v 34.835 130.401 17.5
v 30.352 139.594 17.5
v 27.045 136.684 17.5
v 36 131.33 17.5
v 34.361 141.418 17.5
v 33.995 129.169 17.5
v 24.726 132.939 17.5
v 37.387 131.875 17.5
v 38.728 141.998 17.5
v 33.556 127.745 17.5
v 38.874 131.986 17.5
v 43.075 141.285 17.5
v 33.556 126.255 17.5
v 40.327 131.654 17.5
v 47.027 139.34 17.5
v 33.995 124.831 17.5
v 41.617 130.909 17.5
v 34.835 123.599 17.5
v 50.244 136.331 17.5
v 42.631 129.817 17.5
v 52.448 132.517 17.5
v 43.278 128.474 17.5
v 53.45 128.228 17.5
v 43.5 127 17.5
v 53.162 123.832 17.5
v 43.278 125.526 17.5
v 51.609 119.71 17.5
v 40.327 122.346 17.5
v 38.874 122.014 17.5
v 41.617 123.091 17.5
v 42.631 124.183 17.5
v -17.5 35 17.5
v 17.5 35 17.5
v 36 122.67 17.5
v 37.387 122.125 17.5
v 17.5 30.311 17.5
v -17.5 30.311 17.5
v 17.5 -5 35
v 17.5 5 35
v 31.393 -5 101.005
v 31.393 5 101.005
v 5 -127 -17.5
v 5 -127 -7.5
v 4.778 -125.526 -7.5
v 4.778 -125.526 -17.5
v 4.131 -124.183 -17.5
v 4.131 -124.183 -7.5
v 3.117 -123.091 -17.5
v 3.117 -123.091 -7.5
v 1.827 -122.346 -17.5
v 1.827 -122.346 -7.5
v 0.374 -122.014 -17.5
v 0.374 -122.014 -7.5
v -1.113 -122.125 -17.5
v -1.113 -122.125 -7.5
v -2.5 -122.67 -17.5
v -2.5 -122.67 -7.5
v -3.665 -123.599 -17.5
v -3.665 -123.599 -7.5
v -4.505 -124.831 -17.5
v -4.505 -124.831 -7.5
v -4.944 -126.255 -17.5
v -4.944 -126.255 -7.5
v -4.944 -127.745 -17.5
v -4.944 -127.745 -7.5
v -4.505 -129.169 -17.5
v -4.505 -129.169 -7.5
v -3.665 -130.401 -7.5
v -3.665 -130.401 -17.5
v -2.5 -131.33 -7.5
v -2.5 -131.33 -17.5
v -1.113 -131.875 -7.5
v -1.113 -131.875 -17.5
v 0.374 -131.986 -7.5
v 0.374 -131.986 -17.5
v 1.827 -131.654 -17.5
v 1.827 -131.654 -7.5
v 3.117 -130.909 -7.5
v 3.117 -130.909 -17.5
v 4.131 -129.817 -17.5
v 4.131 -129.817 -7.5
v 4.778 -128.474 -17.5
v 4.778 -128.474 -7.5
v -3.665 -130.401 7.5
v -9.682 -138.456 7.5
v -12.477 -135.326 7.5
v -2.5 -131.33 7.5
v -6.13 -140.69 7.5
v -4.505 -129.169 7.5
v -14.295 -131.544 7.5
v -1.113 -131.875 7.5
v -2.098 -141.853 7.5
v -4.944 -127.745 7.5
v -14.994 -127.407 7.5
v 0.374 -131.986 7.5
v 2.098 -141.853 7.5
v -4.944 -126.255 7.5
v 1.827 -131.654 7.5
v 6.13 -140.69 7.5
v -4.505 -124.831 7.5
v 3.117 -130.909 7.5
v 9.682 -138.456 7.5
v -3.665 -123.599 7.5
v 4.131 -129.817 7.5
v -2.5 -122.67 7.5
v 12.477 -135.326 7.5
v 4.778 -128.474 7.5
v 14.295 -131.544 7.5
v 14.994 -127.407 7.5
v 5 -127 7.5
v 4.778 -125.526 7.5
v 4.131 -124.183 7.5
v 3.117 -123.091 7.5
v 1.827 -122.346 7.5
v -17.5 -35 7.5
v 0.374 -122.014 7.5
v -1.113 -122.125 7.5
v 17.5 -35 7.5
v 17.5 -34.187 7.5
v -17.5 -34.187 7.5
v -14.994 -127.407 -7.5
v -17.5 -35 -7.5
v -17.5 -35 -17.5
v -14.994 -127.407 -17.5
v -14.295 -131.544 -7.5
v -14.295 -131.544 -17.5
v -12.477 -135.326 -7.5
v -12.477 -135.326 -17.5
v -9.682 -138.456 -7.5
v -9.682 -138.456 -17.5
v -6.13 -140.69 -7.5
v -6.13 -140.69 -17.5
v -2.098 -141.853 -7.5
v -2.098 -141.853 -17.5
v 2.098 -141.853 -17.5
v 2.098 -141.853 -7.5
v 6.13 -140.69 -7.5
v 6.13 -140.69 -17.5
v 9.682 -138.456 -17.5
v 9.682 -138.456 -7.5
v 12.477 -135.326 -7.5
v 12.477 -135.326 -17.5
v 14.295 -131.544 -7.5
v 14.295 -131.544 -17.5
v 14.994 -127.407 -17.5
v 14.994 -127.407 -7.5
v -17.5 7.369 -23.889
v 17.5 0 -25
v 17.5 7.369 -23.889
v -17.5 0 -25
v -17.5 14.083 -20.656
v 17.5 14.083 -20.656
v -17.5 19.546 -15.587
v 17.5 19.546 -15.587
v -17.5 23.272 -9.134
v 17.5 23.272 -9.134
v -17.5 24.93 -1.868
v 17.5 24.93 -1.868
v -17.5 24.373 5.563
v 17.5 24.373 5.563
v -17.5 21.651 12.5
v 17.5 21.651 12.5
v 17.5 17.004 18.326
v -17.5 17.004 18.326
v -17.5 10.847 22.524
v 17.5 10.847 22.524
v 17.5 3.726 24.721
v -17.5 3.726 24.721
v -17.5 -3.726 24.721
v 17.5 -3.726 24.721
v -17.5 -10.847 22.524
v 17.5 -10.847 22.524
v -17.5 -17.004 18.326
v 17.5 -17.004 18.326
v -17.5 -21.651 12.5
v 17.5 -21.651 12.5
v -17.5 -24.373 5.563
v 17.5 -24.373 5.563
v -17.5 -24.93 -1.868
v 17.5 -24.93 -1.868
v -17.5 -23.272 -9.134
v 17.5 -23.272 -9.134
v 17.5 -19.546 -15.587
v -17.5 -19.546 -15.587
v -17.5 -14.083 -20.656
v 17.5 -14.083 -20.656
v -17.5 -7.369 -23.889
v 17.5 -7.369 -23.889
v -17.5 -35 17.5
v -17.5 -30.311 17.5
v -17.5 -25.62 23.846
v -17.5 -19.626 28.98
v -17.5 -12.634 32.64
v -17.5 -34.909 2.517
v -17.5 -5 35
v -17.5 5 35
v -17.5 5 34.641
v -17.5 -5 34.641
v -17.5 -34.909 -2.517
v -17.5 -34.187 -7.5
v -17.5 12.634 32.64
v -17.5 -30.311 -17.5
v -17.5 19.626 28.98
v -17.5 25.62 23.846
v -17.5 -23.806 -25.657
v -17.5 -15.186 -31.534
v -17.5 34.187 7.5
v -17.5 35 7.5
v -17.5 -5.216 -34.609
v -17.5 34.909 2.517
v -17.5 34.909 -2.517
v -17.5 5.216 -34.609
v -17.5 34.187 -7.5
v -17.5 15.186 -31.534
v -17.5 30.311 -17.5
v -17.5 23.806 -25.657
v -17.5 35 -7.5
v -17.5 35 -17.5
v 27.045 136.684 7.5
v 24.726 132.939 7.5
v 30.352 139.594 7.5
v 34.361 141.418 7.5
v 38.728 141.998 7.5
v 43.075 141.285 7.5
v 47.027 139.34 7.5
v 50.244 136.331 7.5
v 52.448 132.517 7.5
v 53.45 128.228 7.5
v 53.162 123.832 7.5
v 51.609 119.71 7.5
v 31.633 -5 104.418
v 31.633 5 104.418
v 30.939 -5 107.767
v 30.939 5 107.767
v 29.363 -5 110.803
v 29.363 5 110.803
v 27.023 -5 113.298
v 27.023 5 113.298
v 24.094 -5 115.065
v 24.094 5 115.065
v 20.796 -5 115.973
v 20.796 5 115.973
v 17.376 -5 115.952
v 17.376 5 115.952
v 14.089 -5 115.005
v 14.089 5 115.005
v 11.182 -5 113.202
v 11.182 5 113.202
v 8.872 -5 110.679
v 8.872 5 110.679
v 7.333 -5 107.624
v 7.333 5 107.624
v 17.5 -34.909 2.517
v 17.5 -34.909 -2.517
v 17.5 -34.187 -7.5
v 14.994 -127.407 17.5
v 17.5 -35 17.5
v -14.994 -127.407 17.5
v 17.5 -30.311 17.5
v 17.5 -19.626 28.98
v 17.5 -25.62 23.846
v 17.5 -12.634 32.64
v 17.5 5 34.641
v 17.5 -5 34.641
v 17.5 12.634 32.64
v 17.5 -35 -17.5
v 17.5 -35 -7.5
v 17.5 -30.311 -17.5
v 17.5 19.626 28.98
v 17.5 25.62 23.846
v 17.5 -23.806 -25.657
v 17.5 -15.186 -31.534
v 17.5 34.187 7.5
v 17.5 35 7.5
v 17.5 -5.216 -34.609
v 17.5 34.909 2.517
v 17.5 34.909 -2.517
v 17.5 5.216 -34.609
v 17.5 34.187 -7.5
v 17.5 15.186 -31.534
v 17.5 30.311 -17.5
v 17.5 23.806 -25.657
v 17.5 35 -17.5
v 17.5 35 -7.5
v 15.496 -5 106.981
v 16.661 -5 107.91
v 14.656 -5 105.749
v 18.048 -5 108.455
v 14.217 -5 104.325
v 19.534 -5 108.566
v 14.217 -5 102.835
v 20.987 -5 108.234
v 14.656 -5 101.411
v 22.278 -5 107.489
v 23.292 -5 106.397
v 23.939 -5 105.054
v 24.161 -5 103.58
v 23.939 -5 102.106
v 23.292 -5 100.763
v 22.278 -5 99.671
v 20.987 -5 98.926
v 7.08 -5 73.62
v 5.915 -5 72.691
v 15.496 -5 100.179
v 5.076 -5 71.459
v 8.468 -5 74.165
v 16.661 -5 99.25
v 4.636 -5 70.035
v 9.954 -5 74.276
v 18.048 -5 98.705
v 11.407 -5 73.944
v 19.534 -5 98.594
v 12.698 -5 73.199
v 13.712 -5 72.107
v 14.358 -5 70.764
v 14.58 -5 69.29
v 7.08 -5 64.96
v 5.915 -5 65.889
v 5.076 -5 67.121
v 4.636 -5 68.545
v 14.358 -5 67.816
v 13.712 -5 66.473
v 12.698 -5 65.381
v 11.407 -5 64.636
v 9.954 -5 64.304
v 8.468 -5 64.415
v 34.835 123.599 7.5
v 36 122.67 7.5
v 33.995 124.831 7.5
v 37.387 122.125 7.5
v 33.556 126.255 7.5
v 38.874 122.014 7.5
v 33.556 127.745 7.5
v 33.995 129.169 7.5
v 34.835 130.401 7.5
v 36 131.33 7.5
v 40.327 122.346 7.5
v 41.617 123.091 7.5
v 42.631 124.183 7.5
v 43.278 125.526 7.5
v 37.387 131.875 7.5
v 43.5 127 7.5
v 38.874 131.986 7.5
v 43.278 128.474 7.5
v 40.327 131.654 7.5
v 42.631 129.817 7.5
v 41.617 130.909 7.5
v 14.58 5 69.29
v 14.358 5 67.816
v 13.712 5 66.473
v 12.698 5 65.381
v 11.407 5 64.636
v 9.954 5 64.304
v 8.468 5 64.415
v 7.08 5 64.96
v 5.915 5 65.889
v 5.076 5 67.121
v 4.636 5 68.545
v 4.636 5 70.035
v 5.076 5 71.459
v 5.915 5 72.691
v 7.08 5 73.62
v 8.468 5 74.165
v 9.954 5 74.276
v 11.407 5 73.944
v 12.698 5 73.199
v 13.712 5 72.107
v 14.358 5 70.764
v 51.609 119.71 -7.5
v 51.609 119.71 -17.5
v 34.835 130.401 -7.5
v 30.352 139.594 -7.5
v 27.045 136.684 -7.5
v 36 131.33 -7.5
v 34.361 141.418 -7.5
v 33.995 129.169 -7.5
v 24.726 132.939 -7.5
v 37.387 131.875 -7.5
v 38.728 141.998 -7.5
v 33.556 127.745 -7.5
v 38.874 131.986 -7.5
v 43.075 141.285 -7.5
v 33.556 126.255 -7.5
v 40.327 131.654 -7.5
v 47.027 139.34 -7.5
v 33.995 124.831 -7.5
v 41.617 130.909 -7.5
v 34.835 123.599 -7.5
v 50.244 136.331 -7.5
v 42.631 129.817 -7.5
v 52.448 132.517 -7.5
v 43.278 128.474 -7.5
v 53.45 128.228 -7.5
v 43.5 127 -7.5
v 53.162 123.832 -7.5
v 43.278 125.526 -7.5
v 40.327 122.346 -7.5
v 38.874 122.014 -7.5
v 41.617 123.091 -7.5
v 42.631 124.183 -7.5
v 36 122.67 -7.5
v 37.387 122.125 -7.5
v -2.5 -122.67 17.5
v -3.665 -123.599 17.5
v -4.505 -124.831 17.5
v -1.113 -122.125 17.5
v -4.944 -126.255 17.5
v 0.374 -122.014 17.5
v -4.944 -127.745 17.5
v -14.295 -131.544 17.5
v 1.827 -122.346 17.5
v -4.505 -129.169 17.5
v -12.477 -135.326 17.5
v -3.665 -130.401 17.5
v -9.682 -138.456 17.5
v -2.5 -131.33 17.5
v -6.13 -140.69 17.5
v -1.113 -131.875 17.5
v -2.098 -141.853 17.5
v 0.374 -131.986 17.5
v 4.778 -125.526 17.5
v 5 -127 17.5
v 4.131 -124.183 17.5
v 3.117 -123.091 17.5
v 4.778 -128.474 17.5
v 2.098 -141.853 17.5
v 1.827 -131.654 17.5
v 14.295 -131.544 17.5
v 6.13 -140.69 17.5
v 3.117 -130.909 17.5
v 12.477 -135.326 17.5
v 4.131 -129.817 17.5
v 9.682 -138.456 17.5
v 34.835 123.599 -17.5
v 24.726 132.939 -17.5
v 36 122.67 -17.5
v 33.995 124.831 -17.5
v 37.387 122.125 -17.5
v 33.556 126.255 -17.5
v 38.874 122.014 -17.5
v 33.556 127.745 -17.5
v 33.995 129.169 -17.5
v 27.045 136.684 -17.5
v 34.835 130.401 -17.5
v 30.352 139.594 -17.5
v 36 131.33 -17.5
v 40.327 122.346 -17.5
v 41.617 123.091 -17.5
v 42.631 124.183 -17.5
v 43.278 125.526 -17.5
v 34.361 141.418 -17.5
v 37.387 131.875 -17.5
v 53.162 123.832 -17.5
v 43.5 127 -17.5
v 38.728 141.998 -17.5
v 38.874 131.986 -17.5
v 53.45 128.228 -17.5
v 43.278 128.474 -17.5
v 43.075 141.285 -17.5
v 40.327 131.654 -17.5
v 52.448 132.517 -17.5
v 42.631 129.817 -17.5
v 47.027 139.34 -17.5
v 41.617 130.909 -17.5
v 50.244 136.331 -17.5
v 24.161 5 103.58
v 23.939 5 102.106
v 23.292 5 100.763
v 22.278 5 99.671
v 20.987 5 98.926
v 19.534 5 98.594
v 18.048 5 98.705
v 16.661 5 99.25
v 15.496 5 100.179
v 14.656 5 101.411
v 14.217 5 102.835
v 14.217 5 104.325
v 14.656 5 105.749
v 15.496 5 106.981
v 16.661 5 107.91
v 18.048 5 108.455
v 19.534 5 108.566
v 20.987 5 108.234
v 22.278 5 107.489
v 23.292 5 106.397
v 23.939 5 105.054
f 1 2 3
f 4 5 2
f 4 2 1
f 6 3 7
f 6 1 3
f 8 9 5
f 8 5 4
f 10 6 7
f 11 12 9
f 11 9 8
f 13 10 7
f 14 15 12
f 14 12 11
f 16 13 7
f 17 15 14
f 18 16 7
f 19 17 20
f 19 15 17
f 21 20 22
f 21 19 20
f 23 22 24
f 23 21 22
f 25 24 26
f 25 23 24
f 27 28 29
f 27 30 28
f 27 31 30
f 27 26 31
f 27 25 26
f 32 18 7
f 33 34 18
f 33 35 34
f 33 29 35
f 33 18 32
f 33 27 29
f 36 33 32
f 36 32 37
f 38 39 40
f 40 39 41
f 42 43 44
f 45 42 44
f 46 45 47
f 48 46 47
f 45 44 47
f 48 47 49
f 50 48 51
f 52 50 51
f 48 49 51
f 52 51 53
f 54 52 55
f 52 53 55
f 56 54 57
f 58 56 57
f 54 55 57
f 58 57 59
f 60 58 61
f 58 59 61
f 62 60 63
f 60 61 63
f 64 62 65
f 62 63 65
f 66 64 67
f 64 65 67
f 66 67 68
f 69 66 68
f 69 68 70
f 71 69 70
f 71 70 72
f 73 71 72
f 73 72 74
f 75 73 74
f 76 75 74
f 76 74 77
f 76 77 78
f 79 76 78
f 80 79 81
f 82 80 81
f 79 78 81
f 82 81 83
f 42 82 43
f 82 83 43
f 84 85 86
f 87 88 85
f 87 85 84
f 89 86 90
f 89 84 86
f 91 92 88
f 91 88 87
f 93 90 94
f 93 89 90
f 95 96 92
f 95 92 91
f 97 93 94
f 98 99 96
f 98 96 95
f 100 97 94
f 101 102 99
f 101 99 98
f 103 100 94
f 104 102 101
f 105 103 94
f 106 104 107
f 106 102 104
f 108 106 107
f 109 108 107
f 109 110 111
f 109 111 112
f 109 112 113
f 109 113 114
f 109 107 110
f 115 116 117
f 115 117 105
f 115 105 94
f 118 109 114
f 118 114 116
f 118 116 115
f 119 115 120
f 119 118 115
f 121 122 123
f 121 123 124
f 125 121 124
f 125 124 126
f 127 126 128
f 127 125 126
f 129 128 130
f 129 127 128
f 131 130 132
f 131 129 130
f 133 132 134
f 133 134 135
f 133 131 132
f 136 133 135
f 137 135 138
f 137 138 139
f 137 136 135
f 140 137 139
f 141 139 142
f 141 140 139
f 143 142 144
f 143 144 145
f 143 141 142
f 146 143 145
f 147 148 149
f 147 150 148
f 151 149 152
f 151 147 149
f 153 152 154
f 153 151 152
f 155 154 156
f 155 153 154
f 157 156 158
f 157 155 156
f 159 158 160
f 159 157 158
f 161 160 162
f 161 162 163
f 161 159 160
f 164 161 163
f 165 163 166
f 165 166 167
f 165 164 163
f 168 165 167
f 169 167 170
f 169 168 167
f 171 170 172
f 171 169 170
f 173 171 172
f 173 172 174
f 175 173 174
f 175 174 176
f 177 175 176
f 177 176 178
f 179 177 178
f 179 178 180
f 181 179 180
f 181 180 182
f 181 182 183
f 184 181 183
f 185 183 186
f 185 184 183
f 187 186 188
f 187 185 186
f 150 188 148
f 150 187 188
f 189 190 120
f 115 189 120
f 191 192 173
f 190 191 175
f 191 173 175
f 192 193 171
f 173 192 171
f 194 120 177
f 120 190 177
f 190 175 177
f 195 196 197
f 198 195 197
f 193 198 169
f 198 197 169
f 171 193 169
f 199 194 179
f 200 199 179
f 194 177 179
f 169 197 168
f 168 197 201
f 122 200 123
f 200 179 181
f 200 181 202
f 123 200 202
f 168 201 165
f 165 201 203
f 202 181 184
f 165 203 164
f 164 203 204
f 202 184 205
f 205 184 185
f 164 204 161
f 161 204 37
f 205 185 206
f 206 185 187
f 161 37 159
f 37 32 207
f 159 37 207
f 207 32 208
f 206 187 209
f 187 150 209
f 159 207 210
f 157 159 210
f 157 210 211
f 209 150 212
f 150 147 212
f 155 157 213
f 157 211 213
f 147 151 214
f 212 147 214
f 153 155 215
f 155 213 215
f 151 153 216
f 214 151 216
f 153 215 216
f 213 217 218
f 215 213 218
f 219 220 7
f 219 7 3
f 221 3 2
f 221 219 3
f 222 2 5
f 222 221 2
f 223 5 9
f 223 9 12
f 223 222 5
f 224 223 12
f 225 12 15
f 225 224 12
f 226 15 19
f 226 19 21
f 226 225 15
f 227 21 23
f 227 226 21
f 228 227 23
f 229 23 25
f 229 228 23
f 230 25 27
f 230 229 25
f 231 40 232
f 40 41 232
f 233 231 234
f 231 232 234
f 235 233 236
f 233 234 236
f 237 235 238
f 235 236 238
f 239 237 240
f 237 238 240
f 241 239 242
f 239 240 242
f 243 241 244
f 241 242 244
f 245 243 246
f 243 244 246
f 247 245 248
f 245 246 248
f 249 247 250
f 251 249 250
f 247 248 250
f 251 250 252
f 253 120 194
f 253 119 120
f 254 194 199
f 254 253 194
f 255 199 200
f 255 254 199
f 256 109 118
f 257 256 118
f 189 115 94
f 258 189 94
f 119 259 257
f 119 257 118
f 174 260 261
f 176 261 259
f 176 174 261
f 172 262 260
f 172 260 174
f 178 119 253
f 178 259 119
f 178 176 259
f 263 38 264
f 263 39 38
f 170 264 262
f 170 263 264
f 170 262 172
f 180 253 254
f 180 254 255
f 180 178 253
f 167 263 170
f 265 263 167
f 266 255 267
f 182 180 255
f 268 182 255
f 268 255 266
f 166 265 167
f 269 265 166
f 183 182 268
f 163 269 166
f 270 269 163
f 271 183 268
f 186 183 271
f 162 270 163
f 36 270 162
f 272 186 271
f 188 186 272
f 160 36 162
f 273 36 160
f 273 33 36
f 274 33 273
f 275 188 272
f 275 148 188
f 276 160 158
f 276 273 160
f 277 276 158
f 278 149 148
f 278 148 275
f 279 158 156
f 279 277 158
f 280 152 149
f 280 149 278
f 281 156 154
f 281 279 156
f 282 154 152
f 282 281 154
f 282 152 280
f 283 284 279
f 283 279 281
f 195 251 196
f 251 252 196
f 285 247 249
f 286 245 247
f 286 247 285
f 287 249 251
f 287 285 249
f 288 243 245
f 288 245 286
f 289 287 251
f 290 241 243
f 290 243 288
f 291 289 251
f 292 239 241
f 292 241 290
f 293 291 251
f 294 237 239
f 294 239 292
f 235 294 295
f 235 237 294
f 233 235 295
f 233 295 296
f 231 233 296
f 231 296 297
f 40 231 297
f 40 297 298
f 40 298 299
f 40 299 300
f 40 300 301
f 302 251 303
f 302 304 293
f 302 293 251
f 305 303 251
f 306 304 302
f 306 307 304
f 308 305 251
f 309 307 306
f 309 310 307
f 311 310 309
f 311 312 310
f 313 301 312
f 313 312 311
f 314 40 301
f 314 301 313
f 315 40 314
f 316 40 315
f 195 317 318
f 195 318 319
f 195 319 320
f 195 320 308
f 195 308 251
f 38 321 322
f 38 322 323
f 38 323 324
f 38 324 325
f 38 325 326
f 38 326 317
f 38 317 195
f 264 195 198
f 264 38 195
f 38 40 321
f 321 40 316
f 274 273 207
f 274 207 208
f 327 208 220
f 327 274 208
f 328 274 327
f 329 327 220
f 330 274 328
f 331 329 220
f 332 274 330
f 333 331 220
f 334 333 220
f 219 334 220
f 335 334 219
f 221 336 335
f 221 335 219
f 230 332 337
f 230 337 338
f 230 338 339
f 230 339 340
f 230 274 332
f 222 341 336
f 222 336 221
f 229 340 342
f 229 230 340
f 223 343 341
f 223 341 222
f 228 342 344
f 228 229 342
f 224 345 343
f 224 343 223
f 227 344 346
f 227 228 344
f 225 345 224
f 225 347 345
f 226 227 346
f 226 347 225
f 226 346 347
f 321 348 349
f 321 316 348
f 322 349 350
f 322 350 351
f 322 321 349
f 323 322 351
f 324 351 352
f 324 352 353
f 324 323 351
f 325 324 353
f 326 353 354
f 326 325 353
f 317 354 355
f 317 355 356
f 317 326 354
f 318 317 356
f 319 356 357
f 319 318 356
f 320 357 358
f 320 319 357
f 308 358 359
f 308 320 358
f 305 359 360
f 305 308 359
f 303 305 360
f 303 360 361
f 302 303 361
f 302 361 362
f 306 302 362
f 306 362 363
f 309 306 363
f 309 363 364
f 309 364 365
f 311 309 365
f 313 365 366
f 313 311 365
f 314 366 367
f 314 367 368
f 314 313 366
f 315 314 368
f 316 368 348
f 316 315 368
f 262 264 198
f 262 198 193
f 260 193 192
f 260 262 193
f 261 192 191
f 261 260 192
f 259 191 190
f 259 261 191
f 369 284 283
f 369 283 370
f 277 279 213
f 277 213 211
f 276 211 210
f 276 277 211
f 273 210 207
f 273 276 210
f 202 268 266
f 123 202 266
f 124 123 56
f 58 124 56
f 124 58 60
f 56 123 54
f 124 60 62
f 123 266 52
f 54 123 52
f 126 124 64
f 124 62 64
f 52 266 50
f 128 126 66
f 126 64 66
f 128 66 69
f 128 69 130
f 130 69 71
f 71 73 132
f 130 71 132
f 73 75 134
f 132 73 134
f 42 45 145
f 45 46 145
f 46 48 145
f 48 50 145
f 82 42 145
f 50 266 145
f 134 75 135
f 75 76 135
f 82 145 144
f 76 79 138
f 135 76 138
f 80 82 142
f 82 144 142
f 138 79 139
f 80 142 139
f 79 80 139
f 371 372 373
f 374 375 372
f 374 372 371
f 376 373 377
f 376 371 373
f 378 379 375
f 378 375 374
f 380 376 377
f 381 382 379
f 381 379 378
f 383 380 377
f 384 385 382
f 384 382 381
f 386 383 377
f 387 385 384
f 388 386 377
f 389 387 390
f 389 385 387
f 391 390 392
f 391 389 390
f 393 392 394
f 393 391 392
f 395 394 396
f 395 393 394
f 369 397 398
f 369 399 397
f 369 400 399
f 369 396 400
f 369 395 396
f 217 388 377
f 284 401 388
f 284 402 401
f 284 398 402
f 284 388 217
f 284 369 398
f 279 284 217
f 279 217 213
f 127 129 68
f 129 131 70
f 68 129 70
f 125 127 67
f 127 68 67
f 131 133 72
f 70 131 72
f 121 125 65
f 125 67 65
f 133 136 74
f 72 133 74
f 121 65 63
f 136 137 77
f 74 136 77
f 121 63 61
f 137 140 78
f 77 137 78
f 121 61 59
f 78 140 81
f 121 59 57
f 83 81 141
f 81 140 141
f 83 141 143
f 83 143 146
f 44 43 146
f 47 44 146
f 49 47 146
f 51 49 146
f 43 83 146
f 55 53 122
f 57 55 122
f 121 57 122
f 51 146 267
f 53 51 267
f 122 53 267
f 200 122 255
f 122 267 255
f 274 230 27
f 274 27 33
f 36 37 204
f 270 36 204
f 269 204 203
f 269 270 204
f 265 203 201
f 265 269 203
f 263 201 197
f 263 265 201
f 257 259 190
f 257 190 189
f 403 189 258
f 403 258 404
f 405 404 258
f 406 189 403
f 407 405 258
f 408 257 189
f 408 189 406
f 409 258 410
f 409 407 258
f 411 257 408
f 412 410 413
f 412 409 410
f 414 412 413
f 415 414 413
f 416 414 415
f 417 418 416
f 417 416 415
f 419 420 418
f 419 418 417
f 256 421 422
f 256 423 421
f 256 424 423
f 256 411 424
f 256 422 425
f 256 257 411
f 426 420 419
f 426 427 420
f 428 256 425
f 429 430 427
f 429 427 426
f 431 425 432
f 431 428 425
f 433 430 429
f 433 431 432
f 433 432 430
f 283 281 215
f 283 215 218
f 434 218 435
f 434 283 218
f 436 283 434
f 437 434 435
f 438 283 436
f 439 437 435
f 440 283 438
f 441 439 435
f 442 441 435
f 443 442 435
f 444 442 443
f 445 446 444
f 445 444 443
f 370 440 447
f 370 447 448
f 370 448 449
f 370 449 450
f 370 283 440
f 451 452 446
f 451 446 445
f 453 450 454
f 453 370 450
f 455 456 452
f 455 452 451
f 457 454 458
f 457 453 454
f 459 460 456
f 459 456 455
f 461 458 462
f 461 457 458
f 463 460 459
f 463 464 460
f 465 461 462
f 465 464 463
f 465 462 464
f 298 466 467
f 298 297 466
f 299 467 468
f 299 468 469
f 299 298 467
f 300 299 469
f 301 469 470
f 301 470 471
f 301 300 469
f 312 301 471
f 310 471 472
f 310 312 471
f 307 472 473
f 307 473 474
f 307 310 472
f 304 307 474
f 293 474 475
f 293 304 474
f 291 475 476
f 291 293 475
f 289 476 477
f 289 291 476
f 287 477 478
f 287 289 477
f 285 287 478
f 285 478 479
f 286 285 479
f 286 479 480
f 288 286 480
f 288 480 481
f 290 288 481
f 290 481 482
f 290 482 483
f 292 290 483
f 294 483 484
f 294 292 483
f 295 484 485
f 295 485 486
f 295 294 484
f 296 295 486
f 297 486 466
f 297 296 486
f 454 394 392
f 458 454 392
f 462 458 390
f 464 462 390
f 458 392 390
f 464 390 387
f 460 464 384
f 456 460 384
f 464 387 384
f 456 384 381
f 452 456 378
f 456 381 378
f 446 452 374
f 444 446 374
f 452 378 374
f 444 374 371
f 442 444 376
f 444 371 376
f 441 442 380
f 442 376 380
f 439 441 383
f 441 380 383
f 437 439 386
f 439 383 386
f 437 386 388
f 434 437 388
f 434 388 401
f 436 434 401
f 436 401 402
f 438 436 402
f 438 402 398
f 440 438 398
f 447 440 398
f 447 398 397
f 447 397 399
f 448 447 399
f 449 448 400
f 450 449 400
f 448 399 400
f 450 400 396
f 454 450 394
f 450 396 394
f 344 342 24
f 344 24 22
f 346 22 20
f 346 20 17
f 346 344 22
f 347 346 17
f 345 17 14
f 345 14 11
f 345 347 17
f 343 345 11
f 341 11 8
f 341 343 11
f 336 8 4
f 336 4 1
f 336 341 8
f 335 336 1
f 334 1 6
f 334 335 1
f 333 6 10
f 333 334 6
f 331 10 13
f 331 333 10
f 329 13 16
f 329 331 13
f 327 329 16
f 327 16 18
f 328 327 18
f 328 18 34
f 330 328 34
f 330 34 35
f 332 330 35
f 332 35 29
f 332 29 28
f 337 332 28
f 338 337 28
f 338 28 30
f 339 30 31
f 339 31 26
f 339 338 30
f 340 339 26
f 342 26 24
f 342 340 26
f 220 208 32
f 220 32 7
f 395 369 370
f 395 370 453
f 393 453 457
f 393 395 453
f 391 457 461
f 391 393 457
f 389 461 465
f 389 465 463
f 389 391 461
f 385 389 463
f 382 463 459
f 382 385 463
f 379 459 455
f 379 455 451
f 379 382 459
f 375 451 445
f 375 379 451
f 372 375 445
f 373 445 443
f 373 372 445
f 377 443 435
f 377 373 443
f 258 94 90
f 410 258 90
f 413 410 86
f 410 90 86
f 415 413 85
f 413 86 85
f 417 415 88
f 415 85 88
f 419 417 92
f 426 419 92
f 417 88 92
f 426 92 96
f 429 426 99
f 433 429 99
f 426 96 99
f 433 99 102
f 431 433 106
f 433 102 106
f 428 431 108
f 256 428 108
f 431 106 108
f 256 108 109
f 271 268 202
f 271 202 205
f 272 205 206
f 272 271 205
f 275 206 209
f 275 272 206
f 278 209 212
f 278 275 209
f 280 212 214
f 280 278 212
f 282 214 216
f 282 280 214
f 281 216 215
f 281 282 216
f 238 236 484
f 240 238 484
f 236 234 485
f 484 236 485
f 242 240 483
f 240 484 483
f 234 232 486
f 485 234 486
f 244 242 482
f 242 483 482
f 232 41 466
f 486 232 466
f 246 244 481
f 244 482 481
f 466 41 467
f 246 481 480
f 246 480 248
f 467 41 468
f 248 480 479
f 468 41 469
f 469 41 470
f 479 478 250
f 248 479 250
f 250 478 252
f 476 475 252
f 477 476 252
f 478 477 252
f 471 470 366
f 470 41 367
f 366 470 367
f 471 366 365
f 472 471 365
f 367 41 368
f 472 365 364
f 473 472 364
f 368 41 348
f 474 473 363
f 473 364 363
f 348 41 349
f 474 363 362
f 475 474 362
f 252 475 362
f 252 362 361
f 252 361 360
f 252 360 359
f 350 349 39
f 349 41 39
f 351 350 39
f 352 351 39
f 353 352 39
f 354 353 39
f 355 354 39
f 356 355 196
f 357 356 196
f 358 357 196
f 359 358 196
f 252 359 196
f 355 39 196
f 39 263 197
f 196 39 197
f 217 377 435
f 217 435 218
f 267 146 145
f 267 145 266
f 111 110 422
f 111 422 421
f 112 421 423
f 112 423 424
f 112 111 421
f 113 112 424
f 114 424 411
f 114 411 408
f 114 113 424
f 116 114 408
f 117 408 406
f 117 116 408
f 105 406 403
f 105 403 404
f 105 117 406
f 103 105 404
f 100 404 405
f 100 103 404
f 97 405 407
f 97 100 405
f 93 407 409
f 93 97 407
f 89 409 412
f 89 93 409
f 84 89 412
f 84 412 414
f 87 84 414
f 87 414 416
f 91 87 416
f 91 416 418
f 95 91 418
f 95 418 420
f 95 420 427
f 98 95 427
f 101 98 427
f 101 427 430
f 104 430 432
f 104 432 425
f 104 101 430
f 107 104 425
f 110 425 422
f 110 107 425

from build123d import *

# Parameters (mm, degrees)
SKETCH1_R             = 35
SKETCH1_R_2           = 25
BOSS_EXTRUDE1_DEPTH   = 17.5
SKETCH5_R             = 5
BOSS_EXTRUDE3_DEPTH   = 10
BOSS_EXTRUDE3_2_DEPTH = 10
SKETCH4_R             = 5
BOSS_EXTRUDE5_DEPTH   = 10
BOSS_EXTRUDE5_2_DEPTH = 10
BOSS_EXTRUDE6_DEPTH   = 35
SKETCH14_R            = 5
BOSS_EXTRUDE12_DEPTH  = 5
BOSS_EXTRUDE13_DEPTH  = 35


with BuildPart() as part:
    # Sketch1 → Boss-Extrude1 (new body, symmetric)
    with BuildSketch(Plane(origin=(0, 0, 0), x_dir=(0, 0, -1), z_dir=(1, 0, 0))):
        Circle(SKETCH1_R)
        Circle(SKETCH1_R_2, mode=Mode.SUBTRACT)
    extrude(amount=BOSS_EXTRUDE1_DEPTH, both=True)



with BuildPart() as body_2:
    # Sketch5 → Boss-Extrude3 (new body)
    with BuildSketch(Plane.XY.offset(-7.5)):
        with BuildLine():
            Line((-17.5, -35), (-14.994489274, -127.40656046))
            ThreePointArc((-14.994489274, -127.40656046), (0, -142), (14.994489274, -127.40656046))
            Line((14.994489274, -127.40656046), (17.5, -35))
            Line((17.5, -35), (-17.5, -35))
        make_face()
        with Locations((0, -127)):
            Circle(SKETCH5_R, mode=Mode.SUBTRACT)
    extrude(amount=-BOSS_EXTRUDE3_DEPTH)


with BuildPart() as body_3:
    # Sketch5 → Boss-Extrude3 2 (new body)
    with BuildSketch(Plane.XY.offset(-7.5)):
        with BuildLine():
            Line((-17.5, 35), (17.5, 35))
            Line((17.5, 35), (51.609186621, 119.709648423))
            ThreePointArc((51.609186621, 119.709648423), (45.122886874, 140.458728374), (24.725687056, 132.938712227))
            Line((24.725687056, 132.938712227), (-17.5, 35))
        make_face()
        with Locations((38.5, 127)):
            Circle(SKETCH5_R, mode=Mode.SUBTRACT)
    extrude(amount=-BOSS_EXTRUDE3_2_DEPTH)


with BuildPart() as body_4:
    # Sketch4 → Boss-Extrude5 (new body)
    with BuildSketch(Plane.XY.offset(7.5)):
        with BuildLine():
            Line((-17.5, -35), (-14.994489274, -127.40656046))
            ThreePointArc((-14.994489274, -127.40656046), (0, -142), (14.994489274, -127.40656046))
            Line((14.994489274, -127.40656046), (17.5, -35))
            Line((17.5, -35), (-17.5, -35))
        make_face()
        with Locations((0, -127)):
            Circle(SKETCH4_R, mode=Mode.SUBTRACT)
    extrude(amount=BOSS_EXTRUDE5_DEPTH)


with BuildPart() as body_5:
    # Sketch4 → Boss-Extrude5 2 (new body)
    with BuildSketch(Plane.XY.offset(7.5)):
        with BuildLine():
            Line((-17.5, 35), (24.725687056, 132.938712227))
            ThreePointArc((24.725687056, 132.938712227), (45.122886874, 140.458728374), (51.609186621, 119.709648423))
            Line((51.609186621, 119.709648423), (17.5, 35))
            Line((17.5, 35), (-17.5, 35))
        make_face()
        with Locations((38.5, 127)):
            Circle(SKETCH4_R, mode=Mode.SUBTRACT)
    extrude(amount=BOSS_EXTRUDE5_2_DEPTH)


with BuildPart() as part_1:
    add(part.part)

    add(body_2.part)  # Boss-Extrude6 merges body 2

    add(body_3.part)  # Boss-Extrude6 merges body 3

    add(body_4.part)  # Boss-Extrude6 merges body 4

    add(body_5.part)  # Boss-Extrude6 merges body 5
    # Sketch7 → Boss-Extrude6 (add)
    with BuildSketch(Plane(origin=(17.5, 0, 0), x_dir=(0, 0, -1), z_dir=(1, 0, 0))):
        with BuildLine():
            Line((-17.5, 35), (-17.5, 30.310889132))
            ThreePointArc((-17.5, 30.310889132), (-12.64934905, 32.634245335), (-7.5, 34.186985828))
            Line((-7.5, 34.186985828), (-7.5, 35))
            Line((-7.5, 35), (-17.5, 35))
        make_face()
        with BuildLine():
            Line((7.5, 35), (7.5, 34.186985828))
            ThreePointArc((7.5, 34.186985828), (12.64934905, 32.634245335), (17.5, 30.310889132))
            Line((17.5, 30.310889132), (17.5, 35))
            Line((17.5, 35), (7.5, 35))
        make_face()
        with BuildLine():
            Line((7.5, -35), (7.5, -34.186985828))
            ThreePointArc((7.5, -34.186985828), (12.64934905, -32.634245335), (17.5, -30.310889132))
            Line((17.5, -30.310889132), (17.5, -35))
            Line((17.5, -35), (7.5, -35))
        make_face()
        with BuildLine():
            Line((-7.5, -35), (-7.5, -34.186985828))
            ThreePointArc((-7.5, -34.186985828), (-12.64934905, -32.634245335), (-17.5, -30.310889132))
            Line((-17.5, -30.310889132), (-17.5, -35))
            Line((-17.5, -35), (-7.5, -35))
        make_face()
    extrude(amount=-BOSS_EXTRUDE6_DEPTH)



with BuildPart() as body_2_2:
    # Sketch14 → Boss-Extrude12 (new body, symmetric)
    with BuildSketch(Plane(origin=(0, 0, 0), x_dir=(1, 0, 0), z_dir=(0, 1, 0))):
        with BuildLine():
            Line((17.5, -35), (31.392771581, -101.005420222))
            ThreePointArc((31.392771581, -101.005420222), (22.476413008, -115.632244571), (7.333133213, -107.624341112))
            Line((7.333133213, -107.624341112), (-17.5, -35))
            Line((-17.5, -35), (17.5, -35))
        make_face()
        with Locations((19.160783232, -103.58)):
            Circle(SKETCH14_R, mode=Mode.SUBTRACT)
        with Locations((9.580391616, -69.29)):
            Circle(SKETCH14_R, mode=Mode.SUBTRACT)
    extrude(amount=BOSS_EXTRUDE12_DEPTH, both=True)


with BuildPart() as part_2:
    add(part_1.part)

    add(body_2_2.part)  # Boss-Extrude13 merges body 2 2
    # Sketch15 → Boss-Extrude13 (add)
    with BuildSketch(Plane(origin=(17.5, 0, 0), x_dir=(0, 0, -1), z_dir=(1, 0, 0))):
        with BuildLine():
            Line((-35, 0), (-35, -5))
            Line((-35, -5), (-34.641016151, -5))
            ThreePointArc((-34.641016151, -5), (-34.91013868, -2.506435188), (-35, 0))
        make_face()
        with BuildLine():
            Line((-35, 5), (-35, 0))
            ThreePointArc((-35, 0), (-34.91013868, 2.506435188), (-34.641016151, 5))
            Line((-34.641016151, 5), (-35, 5))
        make_face()
    extrude(amount=-BOSS_EXTRUDE13_DEPTH)


solid = part_2.part
